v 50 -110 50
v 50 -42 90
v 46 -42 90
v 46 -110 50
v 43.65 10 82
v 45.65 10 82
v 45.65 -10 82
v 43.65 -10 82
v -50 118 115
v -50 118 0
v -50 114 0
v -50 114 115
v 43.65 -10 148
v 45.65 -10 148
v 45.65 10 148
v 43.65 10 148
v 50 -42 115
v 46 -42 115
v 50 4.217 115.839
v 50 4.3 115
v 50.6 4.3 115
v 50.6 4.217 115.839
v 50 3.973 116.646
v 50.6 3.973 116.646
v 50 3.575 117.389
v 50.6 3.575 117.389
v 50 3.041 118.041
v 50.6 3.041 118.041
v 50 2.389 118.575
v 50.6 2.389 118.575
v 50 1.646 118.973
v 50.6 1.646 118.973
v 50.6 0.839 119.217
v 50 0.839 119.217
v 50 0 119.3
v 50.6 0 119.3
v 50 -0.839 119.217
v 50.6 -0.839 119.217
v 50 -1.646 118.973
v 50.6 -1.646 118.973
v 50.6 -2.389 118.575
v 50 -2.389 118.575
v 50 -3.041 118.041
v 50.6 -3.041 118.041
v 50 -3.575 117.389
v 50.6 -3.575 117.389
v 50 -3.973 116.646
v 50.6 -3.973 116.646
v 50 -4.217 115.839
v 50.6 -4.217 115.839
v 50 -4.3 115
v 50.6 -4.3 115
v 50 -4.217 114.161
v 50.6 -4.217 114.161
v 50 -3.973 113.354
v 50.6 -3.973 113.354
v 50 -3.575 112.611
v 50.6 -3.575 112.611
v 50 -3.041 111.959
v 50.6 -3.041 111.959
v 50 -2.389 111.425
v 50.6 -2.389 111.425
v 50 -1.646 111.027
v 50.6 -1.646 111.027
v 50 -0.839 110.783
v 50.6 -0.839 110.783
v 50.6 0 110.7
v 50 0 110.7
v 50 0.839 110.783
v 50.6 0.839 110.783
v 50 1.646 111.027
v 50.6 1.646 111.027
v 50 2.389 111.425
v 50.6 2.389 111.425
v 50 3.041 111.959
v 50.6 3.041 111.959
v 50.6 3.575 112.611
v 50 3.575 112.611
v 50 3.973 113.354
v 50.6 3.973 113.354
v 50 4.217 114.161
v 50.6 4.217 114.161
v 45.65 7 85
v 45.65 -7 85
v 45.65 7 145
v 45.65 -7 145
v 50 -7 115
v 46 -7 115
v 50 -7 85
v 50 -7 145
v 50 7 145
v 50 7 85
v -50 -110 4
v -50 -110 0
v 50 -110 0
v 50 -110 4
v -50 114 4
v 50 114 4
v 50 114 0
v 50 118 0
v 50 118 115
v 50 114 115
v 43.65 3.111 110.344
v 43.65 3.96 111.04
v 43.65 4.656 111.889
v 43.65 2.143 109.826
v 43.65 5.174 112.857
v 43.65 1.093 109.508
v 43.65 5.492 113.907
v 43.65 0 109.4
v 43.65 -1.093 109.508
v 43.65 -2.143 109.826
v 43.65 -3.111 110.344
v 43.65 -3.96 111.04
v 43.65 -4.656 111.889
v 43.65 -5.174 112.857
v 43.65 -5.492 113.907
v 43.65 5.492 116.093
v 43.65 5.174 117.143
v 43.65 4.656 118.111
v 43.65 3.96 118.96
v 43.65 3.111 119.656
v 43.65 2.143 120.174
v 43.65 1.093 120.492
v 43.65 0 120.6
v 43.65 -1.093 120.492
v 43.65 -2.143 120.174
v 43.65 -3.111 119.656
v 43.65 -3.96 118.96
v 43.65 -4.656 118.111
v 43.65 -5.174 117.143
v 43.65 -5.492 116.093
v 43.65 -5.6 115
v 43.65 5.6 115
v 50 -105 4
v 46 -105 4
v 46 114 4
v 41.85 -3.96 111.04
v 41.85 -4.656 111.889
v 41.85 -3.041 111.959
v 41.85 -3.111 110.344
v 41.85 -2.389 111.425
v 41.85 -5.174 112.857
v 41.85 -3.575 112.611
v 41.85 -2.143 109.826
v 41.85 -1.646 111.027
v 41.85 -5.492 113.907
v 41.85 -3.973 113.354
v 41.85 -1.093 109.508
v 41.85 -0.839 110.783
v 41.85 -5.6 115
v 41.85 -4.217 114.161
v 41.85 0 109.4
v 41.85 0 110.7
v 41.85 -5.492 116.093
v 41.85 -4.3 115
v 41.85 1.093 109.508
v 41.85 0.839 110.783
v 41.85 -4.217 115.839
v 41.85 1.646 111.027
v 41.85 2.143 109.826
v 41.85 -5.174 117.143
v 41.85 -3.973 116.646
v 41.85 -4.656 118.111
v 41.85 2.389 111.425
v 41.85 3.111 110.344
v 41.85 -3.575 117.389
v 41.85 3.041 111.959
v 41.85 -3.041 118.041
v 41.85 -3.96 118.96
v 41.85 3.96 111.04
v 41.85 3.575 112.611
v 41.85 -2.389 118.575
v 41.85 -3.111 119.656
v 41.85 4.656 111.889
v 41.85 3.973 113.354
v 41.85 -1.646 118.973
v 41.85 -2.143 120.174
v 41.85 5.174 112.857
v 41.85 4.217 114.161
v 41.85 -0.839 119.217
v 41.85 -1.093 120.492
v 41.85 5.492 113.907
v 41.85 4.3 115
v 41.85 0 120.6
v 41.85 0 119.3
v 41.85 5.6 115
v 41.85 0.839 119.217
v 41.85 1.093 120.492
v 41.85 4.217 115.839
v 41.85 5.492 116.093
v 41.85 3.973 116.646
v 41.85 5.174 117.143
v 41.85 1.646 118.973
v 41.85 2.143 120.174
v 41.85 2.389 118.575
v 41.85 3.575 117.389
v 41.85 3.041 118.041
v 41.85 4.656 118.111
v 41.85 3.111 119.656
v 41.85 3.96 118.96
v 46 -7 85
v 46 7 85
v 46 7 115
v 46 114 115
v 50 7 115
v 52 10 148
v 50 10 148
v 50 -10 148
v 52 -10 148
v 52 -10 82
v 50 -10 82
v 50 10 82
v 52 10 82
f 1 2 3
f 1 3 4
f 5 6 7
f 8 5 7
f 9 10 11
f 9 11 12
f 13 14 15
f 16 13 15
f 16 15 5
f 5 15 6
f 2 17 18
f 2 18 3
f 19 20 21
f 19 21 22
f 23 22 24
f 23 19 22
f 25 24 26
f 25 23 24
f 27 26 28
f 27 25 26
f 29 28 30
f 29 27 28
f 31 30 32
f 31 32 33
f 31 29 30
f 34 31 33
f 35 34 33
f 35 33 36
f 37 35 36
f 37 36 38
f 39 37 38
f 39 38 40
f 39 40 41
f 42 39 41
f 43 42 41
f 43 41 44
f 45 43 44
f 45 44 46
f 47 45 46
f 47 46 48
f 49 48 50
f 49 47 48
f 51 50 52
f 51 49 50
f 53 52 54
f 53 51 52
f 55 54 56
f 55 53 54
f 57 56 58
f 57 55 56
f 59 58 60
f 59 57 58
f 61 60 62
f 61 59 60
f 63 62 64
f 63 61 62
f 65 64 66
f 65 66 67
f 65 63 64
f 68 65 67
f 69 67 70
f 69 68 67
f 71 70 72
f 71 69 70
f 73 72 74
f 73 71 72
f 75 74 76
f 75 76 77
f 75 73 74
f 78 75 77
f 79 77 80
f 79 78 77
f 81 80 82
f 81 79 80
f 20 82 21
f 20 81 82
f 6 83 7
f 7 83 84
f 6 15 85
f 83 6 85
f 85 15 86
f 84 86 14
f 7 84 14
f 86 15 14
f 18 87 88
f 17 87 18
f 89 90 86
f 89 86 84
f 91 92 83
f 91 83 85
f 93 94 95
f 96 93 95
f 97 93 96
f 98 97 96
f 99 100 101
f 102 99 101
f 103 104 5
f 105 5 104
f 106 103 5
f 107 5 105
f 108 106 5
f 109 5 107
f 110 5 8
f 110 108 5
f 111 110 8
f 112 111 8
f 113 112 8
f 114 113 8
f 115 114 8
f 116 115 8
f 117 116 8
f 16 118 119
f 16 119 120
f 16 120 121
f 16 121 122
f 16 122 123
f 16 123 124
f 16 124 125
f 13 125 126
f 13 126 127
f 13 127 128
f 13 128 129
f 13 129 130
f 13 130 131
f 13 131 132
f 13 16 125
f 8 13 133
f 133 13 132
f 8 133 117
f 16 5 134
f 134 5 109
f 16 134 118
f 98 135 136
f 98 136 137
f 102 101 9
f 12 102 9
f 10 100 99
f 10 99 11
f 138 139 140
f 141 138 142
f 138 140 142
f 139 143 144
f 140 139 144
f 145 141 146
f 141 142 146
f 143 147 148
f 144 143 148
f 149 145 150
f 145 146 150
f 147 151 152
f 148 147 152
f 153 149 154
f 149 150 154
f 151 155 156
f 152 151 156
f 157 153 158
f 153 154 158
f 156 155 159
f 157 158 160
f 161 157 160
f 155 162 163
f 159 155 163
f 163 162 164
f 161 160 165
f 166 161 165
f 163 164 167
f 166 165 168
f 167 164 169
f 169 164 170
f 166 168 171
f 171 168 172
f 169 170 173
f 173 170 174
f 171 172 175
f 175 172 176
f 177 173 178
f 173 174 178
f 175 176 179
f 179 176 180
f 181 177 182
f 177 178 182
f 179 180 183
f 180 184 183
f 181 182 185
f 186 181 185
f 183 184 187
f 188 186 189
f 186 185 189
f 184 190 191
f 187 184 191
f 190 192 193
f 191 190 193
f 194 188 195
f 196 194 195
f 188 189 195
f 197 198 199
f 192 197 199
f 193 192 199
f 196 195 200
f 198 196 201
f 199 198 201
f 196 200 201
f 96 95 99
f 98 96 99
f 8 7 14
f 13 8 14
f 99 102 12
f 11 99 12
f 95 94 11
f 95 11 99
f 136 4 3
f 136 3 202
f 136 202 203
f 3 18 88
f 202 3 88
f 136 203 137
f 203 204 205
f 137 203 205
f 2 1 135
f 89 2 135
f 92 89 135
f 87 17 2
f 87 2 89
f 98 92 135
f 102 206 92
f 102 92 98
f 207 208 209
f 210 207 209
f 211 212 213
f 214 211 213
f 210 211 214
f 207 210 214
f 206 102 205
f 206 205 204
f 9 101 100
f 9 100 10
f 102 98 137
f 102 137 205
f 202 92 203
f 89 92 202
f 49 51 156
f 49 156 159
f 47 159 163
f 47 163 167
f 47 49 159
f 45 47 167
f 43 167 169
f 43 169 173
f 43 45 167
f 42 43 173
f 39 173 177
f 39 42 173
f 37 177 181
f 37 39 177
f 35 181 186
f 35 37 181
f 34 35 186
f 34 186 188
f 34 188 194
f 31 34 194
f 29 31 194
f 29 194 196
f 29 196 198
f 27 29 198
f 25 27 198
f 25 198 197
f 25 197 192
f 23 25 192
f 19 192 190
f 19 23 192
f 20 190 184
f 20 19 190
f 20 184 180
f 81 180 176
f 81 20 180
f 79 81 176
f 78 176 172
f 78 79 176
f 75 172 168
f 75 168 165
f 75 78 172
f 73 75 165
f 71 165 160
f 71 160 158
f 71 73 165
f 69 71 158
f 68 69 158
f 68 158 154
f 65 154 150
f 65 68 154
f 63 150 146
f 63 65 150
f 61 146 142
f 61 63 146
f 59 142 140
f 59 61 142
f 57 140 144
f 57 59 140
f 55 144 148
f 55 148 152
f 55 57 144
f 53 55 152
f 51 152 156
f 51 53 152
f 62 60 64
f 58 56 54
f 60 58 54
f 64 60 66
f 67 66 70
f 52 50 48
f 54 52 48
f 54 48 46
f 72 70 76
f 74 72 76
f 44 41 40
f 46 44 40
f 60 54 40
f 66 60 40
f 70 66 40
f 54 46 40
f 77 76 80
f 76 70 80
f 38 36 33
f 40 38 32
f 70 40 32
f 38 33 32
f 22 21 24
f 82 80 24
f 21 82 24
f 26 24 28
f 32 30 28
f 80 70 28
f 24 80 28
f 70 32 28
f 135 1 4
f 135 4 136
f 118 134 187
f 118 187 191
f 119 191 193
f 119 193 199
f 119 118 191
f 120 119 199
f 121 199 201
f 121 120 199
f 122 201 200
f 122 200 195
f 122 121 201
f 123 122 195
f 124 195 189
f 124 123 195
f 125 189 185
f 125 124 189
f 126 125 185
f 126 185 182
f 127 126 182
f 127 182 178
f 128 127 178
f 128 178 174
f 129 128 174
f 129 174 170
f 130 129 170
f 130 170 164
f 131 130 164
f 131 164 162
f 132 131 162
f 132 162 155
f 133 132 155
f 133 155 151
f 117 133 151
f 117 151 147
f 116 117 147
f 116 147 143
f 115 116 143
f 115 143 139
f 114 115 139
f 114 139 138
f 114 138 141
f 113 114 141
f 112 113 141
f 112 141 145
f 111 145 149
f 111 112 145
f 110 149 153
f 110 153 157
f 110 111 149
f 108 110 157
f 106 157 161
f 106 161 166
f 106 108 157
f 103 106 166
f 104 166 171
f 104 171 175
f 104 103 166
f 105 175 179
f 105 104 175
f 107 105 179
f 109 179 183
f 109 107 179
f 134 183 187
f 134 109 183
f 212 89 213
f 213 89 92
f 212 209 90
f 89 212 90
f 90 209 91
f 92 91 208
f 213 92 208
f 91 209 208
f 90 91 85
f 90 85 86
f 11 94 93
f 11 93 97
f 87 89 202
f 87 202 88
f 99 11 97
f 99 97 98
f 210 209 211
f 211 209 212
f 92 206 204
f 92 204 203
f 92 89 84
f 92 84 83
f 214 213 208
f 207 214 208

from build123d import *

# Parameters (mm, degrees)
F1_W      = 100
F1_H      = 224
F2_DEPTH  = 4
F4_W      = 100
F4_H      = 115
F5_DEPTH  = 4
F8_DEPTH  = 4
F10_DEPTH = 2
F11_DEPTH = 20
F12_DEPTH = 8.15
F13_DEPTH = 4.45
F16_DEPTH = 2
F17_DEPTH = 0.6


with BuildPart() as f2:
    # F1 (on Top) → F2 (new body)
    with BuildSketch(Plane.XY):
        with Locations((0, 2)):
            Rectangle(F1_W, F1_H)
    extrude(amount=F2_DEPTH)

    # F9 (on offset) → F11 (cut)
    with BuildSketch(Plane.YZ.offset(50)):
        with BuildLine():
            Line((4.3, 115), (-4.3, 115))
            ThreePointArc((-4.3, 115), (0, 110.7), (4.3, 115))
        make_face()
        with BuildLine():
            ThreePointArc((4.3, 115), (0, 119.3), (-4.3, 115))
            Line((-4.3, 115), (4.3, 115))
        make_face()
    extrude(amount=-F11_DEPTH, mode=Mode.SUBTRACT)


with BuildPart() as f5:
    # F4 (on offset) → F5 (new body)
    with BuildSketch(Plane(origin=(0, 118, 0), x_dir=(-1, 0, 0), z_dir=(0, 1, 0))):
        with Locations((0, 57.5)):
            Rectangle(F4_W, F4_H)
    extrude(amount=-F5_DEPTH)


with BuildPart() as f8:
    # F7 (on offset) → F8 (new body)
    with BuildSketch(Plane.YZ.offset(50)):
        Polygon((-110, 50), (-105, 4), (0, 4), (114, 4), (114, 115), (7, 115), (7, 85), (-7, 85), (-7, 115), (-42, 115), (-42, 90), align=None)
    extrude(amount=-F8_DEPTH)


with BuildPart() as f10:
    # F9 (on offset) → F10 (new body)
    with BuildSketch(Plane.YZ.offset(50)):
        Polygon((-7, 85), (-7, 115), (-10, 115), (-10, 82), (10, 82), (10, 115), (7, 115), (7, 85), align=None)
        with BuildLine():
            Line((-5.6, 115), (-7, 115))
            Line((-7, 115), (-7, 85))
            Line((-7, 85), (7, 85))
            Line((7, 85), (7, 115))
            Line((7, 115), (5.6, 115))
            ThreePointArc((5.6, 115), (0, 109.4), (-5.6, 115))
        make_face()
        with BuildLine():
            Line((-4.3, 115), (-5.6, 115))
            ThreePointArc((-5.6, 115), (0, 109.4), (5.6, 115))
            Line((5.6, 115), (4.3, 115))
            ThreePointArc((4.3, 115), (0, 110.7), (-4.3, 115))
        make_face()
        with BuildLine():
            Line((4.3, 115), (-4.3, 115))
            ThreePointArc((-4.3, 115), (0, 110.7), (4.3, 115))
        make_face()
        Polygon((-10, 115), (-7, 115), (-7, 145), (7, 145), (7, 115), (10, 115), (10, 148), (-10, 148), align=None)
        with BuildLine():
            Line((-7, 145), (-7, 115))
            Line((-7, 115), (-5.6, 115))
            ThreePointArc((-5.6, 115), (0, 120.6), (5.6, 115))
            Line((5.6, 115), (7, 115))
            Line((7, 115), (7, 145))
            Line((7, 145), (-7, 145))
        make_face()
        with BuildLine():
            ThreePointArc((5.6, 115), (0, 120.6), (-5.6, 115))
            Line((-5.6, 115), (-4.3, 115))
            ThreePointArc((-4.3, 115), (0, 119.3), (4.3, 115))
            Line((4.3, 115), (5.6, 115))
        make_face()
        with BuildLine():
            ThreePointArc((4.3, 115), (0, 119.3), (-4.3, 115))
            Line((-4.3, 115), (4.3, 115))
        make_face()
    extrude(amount=F10_DEPTH)

    # F9 (on offset) → F12 (join)
    with BuildSketch(Plane.YZ.offset(50)):
        with BuildLine():
            Line((-4.3, 115), (-5.6, 115))
            ThreePointArc((-5.6, 115), (0, 109.4), (5.6, 115))
            Line((5.6, 115), (4.3, 115))
            ThreePointArc((4.3, 115), (0, 110.7), (-4.3, 115))
        make_face()
        with BuildLine():
            ThreePointArc((5.6, 115), (0, 120.6), (-5.6, 115))
            Line((-5.6, 115), (-4.3, 115))
            ThreePointArc((-4.3, 115), (0, 119.3), (4.3, 115))
            Line((4.3, 115), (5.6, 115))
        make_face()
    extrude(amount=-F12_DEPTH)



with BuildPart() as f13:
    # F9 (on offset) → F13 (new body)
    with BuildSketch(Plane.YZ.offset(50)):
        with BuildLine():
            Line((-5.6, 115), (-7, 115))
            Line((-7, 115), (-7, 85))
            Line((-7, 85), (7, 85))
            Line((7, 85), (7, 115))
            Line((7, 115), (5.6, 115))
            ThreePointArc((5.6, 115), (0, 109.4), (-5.6, 115))
        make_face()
        with BuildLine():
            Line((-7, 145), (-7, 115))
            Line((-7, 115), (-5.6, 115))
            ThreePointArc((-5.6, 115), (0, 120.6), (5.6, 115))
            Line((5.6, 115), (7, 115))
            Line((7, 115), (7, 145))
            Line((7, 145), (-7, 145))
        make_face()
    extrude(amount=-F13_DEPTH)


with BuildPart() as f10_1:
    add(f10.part)

    add(f13.part)  # F16 merges F13
    # F15 (on offset) → F16 (join)
    with BuildSketch(Plane(origin=(45.65, 0, 0), x_dir=(0, -1, 0), z_dir=(-1, 0, 0))):
        with BuildLine():
            Line((-10, 115), (-10, 82))
            Line((-10, 82), (10, 82))
            Line((10, 82), (10, 115))
            Line((10, 115), (7, 115))
            Line((7, 115), (5.6, 115))
            ThreePointArc((5.6, 115), (0, 109.4), (-5.6, 115))
            Line((-5.6, 115), (-7, 115))
            Line((-7, 115), (-10, 115))
        make_face()
        Polygon((-10, 148), (-10, 115), (-7, 115), (-7, 145), (7, 145), (7, 115), (10, 115), (10, 148), align=None)
        with BuildLine():
            Line((-7, 145), (-7, 115))
            Line((-7, 115), (-5.6, 115))
            ThreePointArc((-5.6, 115), (0, 120.6), (5.6, 115))
            Line((5.6, 115), (7, 115))
            Line((7, 115), (7, 145))
            Line((7, 145), (-7, 145))
        make_face()
    extrude(amount=F16_DEPTH)

    # F9 (on offset) → F17 (cut)
    with BuildSketch(Plane.YZ.offset(50)):
        with BuildLine():
            Line((4.3, 115), (-4.3, 115))
            ThreePointArc((-4.3, 115), (0, 110.7), (4.3, 115))
        make_face()
        with BuildLine():
            ThreePointArc((4.3, 115), (0, 119.3), (-4.3, 115))
            Line((-4.3, 115), (4.3, 115))
        make_face()
    extrude(amount=F17_DEPTH, mode=Mode.SUBTRACT)


solid = Compound([f2.part, f5.part, f8.part, f10_1.part])
